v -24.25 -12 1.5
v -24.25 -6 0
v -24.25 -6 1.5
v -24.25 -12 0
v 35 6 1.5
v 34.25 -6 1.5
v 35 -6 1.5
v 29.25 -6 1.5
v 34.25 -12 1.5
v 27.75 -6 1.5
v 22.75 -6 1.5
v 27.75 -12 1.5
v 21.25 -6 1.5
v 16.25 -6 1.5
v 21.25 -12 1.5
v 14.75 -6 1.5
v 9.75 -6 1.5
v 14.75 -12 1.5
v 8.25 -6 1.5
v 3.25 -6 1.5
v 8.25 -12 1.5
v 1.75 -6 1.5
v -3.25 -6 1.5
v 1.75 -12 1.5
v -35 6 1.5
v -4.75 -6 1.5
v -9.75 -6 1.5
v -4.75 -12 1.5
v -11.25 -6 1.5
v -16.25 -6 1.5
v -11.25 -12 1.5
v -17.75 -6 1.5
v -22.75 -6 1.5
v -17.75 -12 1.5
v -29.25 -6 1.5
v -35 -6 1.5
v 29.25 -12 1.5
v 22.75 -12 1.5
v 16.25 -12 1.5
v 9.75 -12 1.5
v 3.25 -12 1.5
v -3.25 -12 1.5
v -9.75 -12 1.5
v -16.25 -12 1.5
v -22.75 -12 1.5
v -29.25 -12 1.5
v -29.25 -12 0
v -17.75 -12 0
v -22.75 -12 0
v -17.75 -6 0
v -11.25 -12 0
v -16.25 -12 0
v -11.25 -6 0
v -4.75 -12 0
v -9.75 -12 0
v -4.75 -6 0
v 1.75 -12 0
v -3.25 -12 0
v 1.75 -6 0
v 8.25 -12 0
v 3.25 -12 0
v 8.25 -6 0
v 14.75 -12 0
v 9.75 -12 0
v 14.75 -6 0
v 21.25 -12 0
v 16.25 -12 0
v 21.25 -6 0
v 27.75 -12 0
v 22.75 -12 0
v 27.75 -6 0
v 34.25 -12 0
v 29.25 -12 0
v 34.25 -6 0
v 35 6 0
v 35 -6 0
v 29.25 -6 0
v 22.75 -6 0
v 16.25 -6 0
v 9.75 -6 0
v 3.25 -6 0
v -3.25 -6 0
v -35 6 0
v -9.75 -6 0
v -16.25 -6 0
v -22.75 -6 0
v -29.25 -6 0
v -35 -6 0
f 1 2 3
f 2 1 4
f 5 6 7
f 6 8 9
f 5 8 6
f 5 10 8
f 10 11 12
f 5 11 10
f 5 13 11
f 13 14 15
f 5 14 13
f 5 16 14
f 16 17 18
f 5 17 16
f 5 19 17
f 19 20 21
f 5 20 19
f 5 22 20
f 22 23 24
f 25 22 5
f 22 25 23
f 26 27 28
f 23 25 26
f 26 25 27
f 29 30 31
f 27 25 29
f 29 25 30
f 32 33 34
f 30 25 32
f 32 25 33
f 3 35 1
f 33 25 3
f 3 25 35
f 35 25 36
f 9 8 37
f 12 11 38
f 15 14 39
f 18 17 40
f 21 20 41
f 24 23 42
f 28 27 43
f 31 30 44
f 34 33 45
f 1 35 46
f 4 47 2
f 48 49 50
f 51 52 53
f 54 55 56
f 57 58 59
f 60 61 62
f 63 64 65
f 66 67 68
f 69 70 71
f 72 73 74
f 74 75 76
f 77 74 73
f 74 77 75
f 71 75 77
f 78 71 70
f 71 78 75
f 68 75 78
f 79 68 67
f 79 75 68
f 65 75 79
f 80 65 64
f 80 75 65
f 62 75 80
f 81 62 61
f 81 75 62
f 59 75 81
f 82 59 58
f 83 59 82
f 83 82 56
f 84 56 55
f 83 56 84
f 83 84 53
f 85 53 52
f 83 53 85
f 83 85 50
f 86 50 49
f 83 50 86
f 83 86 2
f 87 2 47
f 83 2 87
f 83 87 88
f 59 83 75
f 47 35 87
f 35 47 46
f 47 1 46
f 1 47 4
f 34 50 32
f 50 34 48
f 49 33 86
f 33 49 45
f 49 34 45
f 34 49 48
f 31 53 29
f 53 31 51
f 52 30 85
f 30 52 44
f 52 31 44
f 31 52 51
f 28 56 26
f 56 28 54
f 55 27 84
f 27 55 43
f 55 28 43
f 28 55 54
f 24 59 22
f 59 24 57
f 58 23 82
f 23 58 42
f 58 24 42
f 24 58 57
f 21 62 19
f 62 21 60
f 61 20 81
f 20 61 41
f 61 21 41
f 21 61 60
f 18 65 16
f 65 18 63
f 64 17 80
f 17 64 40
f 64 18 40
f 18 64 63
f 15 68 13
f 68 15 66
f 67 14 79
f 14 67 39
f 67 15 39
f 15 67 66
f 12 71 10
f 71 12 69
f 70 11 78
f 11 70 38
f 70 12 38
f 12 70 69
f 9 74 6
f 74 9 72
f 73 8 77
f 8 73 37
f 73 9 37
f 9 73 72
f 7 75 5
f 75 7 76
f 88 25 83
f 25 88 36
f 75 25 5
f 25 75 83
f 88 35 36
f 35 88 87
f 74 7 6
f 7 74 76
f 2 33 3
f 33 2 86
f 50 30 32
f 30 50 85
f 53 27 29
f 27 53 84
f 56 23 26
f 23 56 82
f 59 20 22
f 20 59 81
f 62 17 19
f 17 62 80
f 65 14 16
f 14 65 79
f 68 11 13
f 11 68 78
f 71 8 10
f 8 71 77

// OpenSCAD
// 10-well comb for casting agarose gels
// Print orientation: flat on bed, teeth pointing down (-Y)

// ---- Dimensions (mm) ----
plate_t      = 1.5;   // plate thickness (Z)
spine_l      = 70;    // spine length (X)
spine_w      = 12;    // spine width (Y)
tooth_w      = 5.0;   // tooth width (X)
tooth_l      = 12;    // tooth length (Y)
tooth_count  = 10;    // number of teeth
tooth_gap    = 1.5;   // gap between neighbouring teeth (X)
overhang     = 0.5;   // extra length so teeth pass through the plate

$fn = 64;

// ---- Derived ----
pitch   = tooth_w + tooth_gap;            // centre-to-centre spacing
x_start = -(tooth_count - 1) * pitch / 2; // first tooth centre (row centred)

// ---- Model ----
union() {
    // Spine (back bar)
    translate([-spine_l / 2, -spine_w / 2, 0])
        cube([spine_l, spine_w, plate_t]);

    // Teeth
    for (i = [0 : tooth_count - 1])
        translate([x_start + i * pitch, -tooth_l, 0])
            cube([tooth_w, tooth_l + overhang, plate_t]);
}
